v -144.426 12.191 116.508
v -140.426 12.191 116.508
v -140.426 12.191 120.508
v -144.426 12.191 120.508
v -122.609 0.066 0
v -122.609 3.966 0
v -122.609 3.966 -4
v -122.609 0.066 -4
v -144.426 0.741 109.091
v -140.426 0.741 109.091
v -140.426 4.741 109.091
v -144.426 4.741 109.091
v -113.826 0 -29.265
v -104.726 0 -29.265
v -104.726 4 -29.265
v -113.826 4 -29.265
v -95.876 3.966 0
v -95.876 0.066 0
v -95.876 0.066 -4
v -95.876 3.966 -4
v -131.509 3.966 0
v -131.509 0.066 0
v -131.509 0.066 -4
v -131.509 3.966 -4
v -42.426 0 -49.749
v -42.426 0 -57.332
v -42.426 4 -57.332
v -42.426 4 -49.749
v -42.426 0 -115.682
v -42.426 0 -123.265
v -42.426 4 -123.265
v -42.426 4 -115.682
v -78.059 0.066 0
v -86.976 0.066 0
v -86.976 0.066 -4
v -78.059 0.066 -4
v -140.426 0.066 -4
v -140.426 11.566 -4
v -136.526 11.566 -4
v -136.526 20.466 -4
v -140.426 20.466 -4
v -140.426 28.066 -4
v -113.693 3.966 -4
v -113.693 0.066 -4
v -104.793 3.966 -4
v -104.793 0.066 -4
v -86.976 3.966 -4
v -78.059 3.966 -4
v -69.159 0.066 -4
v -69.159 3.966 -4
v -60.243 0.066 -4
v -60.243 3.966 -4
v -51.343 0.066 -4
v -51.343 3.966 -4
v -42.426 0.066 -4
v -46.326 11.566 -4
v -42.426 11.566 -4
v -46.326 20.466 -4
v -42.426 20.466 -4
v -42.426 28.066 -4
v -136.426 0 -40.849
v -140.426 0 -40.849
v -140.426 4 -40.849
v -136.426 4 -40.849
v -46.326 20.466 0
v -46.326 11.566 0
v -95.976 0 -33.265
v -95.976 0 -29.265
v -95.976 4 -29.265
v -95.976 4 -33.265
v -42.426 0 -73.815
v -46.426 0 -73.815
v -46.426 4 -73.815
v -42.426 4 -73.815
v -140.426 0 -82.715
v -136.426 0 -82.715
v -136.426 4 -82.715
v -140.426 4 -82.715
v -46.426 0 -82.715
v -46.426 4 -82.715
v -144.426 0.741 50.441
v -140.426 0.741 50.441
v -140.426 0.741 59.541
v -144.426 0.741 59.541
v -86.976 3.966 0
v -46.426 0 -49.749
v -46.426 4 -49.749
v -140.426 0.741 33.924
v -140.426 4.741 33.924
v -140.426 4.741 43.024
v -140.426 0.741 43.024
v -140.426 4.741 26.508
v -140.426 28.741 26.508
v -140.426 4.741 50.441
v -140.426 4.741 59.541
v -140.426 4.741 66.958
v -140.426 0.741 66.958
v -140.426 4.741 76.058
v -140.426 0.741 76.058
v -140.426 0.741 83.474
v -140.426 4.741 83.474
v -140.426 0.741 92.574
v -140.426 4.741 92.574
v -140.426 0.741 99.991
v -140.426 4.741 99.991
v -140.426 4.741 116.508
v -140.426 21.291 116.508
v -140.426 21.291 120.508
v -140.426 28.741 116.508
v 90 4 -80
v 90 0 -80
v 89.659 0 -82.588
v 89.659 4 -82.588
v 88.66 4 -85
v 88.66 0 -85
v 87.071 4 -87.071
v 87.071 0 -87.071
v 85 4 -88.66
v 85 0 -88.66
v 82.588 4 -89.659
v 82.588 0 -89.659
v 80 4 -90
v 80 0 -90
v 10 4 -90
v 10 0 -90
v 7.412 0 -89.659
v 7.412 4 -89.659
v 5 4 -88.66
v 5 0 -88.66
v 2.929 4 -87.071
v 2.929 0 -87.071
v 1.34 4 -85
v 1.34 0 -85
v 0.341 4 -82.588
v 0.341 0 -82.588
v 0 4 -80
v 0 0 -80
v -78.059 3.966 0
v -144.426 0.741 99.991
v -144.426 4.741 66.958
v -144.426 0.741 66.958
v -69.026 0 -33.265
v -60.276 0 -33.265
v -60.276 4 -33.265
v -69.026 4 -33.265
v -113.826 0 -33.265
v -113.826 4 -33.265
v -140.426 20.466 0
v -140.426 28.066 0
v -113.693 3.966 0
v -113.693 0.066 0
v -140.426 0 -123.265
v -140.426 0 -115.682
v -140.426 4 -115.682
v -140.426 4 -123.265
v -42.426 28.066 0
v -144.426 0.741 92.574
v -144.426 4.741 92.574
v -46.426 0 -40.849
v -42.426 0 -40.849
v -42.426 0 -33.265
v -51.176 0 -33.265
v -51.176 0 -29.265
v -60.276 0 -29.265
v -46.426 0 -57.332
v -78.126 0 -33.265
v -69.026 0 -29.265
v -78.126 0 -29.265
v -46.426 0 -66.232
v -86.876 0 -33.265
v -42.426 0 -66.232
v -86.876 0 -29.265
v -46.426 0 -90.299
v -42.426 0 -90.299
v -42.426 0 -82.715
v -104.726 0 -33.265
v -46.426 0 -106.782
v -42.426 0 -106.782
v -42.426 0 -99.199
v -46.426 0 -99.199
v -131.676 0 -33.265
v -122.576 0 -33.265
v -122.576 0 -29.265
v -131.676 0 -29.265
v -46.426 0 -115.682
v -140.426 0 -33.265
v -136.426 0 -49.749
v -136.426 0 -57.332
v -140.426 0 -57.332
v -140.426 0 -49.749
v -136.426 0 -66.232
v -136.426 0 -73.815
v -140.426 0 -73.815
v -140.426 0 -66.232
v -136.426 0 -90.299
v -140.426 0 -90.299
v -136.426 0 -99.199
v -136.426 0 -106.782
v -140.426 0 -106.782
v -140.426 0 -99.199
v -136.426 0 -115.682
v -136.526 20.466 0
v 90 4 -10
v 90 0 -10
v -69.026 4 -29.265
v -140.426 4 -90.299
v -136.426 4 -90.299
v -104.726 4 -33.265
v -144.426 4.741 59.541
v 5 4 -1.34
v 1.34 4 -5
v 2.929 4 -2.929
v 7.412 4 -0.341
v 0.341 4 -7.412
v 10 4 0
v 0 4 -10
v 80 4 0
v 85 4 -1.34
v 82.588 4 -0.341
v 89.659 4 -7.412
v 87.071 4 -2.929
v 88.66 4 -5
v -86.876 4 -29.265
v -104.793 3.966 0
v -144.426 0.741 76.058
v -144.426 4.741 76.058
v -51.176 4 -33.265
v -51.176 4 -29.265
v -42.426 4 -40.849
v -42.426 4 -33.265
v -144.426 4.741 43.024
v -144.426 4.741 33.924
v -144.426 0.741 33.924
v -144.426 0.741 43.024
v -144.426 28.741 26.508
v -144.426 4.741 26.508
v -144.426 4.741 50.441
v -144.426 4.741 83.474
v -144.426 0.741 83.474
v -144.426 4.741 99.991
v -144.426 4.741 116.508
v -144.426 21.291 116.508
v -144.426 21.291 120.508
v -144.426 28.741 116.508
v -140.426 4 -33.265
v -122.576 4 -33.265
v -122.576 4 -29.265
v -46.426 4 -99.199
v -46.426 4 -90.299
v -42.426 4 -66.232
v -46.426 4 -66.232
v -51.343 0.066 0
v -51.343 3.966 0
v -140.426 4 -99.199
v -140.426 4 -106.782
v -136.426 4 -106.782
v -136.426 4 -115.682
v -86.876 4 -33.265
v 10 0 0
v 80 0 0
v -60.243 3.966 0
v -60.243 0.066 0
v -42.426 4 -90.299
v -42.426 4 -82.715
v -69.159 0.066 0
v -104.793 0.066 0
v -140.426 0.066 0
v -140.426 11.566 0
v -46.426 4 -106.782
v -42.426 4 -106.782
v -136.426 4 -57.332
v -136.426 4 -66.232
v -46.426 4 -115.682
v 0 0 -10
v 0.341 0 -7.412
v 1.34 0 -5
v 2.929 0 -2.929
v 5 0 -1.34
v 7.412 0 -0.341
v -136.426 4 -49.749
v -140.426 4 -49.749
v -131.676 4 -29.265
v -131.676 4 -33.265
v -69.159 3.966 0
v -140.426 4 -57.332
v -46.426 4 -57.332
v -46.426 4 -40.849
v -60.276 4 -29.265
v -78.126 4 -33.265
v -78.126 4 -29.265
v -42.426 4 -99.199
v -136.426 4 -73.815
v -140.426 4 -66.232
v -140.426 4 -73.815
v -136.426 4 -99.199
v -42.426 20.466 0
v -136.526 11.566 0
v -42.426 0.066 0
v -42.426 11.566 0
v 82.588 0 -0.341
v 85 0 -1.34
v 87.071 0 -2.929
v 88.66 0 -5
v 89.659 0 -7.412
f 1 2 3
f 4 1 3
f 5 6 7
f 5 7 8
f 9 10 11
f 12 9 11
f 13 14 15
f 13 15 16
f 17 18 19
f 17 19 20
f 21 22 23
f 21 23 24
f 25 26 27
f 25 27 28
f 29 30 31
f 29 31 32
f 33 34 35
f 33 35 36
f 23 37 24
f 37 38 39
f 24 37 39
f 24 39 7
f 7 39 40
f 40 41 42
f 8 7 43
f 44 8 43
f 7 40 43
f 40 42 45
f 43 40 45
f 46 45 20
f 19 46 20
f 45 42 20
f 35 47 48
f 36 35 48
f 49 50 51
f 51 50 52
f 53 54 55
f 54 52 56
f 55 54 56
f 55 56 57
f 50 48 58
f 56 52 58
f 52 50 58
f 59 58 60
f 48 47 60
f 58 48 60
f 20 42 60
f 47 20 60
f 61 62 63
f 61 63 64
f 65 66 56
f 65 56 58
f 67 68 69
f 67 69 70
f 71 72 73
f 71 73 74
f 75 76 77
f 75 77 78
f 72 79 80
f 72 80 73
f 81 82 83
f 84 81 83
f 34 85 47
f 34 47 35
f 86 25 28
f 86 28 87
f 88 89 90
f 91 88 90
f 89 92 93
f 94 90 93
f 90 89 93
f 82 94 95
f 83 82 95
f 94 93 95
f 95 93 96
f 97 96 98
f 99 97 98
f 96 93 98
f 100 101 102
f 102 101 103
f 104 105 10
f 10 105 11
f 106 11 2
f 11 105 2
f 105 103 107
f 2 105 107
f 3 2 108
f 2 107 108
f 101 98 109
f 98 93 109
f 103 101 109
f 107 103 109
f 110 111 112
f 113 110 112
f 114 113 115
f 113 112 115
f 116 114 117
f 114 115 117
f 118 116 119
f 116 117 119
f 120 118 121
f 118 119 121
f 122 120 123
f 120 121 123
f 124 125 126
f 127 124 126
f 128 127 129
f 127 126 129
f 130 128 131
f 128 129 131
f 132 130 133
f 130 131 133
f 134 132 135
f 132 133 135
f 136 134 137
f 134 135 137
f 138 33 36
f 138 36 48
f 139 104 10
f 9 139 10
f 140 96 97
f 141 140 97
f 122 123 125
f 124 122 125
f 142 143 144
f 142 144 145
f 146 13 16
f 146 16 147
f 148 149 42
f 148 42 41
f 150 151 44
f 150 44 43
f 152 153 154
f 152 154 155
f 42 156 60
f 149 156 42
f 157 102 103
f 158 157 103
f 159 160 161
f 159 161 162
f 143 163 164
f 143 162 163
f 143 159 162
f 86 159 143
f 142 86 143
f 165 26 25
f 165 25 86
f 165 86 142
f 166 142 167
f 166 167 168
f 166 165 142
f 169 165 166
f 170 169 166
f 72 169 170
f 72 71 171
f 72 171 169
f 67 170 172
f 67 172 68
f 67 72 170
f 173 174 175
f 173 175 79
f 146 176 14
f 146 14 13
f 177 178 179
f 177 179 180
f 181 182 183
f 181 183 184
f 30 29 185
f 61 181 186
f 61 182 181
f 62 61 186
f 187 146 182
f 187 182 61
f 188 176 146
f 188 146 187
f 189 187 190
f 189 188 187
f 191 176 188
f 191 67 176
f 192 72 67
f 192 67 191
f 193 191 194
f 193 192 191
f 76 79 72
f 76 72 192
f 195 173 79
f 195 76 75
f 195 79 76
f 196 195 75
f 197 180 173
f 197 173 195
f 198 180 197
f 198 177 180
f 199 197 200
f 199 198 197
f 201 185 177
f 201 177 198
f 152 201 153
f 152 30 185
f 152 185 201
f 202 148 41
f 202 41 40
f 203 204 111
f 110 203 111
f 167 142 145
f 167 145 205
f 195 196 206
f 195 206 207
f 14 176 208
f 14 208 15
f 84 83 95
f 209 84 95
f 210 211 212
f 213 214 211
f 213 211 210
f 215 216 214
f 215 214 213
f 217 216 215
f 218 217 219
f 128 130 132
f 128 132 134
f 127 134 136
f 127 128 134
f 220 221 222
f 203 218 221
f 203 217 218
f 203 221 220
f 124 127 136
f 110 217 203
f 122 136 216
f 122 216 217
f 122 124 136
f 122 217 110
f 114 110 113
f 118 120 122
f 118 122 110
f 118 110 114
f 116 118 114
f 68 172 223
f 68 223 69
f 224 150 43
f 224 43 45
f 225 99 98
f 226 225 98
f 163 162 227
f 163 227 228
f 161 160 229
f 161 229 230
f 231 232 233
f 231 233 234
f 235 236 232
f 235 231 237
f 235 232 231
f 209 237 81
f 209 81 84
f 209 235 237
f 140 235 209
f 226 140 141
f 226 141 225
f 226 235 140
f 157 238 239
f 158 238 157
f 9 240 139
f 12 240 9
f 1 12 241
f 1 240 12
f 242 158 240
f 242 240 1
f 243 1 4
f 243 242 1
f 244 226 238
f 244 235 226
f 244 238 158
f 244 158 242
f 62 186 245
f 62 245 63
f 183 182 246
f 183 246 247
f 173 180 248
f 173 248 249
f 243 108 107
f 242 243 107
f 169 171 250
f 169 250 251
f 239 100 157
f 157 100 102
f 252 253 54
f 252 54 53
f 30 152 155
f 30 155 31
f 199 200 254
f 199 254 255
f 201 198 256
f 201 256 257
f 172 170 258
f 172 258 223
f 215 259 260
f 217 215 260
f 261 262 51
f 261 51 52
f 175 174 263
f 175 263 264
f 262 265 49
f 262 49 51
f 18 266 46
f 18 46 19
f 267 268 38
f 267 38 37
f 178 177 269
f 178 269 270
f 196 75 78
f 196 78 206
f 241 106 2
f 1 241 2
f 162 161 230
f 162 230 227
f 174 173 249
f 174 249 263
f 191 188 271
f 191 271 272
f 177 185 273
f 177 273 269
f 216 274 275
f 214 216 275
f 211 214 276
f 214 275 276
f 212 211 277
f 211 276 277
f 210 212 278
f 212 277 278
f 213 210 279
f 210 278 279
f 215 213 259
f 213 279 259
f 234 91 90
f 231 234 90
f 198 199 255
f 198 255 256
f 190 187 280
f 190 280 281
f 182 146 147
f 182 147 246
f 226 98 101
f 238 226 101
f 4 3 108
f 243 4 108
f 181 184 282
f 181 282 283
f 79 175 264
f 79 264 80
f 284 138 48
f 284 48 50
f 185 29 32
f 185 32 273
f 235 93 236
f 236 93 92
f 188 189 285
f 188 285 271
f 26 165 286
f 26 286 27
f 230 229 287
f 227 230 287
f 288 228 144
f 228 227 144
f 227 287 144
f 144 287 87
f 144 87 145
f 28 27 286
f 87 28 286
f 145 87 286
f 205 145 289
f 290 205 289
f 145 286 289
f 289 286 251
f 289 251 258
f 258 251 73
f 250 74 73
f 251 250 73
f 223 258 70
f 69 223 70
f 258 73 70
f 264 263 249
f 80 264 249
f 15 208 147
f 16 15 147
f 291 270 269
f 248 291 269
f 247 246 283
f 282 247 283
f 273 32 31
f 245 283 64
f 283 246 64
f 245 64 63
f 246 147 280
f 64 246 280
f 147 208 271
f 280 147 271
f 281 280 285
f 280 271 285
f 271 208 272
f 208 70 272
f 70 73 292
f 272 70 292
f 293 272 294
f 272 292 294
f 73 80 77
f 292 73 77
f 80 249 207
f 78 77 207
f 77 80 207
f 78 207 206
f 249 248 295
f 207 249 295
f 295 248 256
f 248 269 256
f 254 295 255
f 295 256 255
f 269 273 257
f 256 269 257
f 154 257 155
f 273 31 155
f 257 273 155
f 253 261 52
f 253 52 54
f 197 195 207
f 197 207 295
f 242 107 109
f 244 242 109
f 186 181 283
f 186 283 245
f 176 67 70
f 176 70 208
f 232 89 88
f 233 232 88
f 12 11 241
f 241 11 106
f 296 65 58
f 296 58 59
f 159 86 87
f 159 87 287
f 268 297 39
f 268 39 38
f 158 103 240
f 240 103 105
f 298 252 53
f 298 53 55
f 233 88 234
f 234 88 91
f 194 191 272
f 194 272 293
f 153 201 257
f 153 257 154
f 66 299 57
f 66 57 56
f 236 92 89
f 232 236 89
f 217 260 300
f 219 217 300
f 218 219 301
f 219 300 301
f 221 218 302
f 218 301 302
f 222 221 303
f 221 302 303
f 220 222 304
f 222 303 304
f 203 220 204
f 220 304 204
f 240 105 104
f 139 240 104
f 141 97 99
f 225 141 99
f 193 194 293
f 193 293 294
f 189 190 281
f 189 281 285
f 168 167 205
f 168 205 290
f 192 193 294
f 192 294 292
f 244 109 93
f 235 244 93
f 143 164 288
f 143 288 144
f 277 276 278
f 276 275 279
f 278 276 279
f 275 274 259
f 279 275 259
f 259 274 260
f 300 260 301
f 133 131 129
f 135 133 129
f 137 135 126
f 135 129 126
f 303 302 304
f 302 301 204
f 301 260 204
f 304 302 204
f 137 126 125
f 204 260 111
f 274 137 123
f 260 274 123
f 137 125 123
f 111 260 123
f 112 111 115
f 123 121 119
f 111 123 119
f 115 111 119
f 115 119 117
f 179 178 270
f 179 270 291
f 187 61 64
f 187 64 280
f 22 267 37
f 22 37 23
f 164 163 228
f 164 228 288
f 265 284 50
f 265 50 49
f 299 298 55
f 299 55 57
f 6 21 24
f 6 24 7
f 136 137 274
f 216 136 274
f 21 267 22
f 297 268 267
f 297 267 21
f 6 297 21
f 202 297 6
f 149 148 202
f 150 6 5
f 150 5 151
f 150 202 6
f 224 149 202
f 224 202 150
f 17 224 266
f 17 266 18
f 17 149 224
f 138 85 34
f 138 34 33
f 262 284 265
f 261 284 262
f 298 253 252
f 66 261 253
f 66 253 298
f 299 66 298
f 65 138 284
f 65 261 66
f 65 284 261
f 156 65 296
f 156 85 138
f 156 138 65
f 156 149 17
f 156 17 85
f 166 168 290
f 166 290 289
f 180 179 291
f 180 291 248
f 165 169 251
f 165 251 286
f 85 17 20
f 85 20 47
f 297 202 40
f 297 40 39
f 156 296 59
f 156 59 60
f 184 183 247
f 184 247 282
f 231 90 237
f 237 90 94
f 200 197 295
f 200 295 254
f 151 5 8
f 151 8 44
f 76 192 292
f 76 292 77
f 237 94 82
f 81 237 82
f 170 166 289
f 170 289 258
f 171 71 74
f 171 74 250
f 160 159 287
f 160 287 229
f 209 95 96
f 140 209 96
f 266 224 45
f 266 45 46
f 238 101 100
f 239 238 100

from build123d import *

# Parameters (mm, degrees)
BOSS_EXTRUDE1_DEPTH = 4
BOSS_EXTRUDE2_DEPTH = 4
BOSS_EXTRUDE3_DEPTH = 4
BOSS_EXTRUDE4_DEPTH = 4


with BuildPart() as part:
    # Sketch1 → Boss-Extrude1 (new body)
    with BuildSketch(Plane(origin=(0, 0, 0), x_dir=(1, 0, 0), z_dir=(0, 1, 0))):
        with BuildLine():
            Line((10, 0), (80, 0))
            ThreePointArc((80, 0), (87.071067812, 2.928932188), (90, 10))
            Line((90, 10), (90, 80))
            ThreePointArc((90, 80), (87.071067812, 87.071067812), (80, 90))
            Line((80, 90), (10, 90))
            ThreePointArc((10, 90), (2.928932188, 87.071067812), (0, 80))
            Line((0, 80), (0, 10))
            ThreePointArc((0, 10), (2.928932188, 2.928932188), (10, 0))
        make_face()
    extrude(amount=BOSS_EXTRUDE1_DEPTH)


with BuildPart() as body_2:
    # Sketch2 → Boss-Extrude2 (new body)
    with BuildSketch(Plane.XY):
        Polygon((-140.425884488, 0.066456233), (-131.509217822, 0.066456233), (-131.509217822, 3.966456233), (-122.609217822, 3.966456233), (-122.609217822, 0.066456233), (-113.692551155, 0.066456233), (-113.692551155, 3.966456233), (-104.792551155, 3.966456233), (-104.792551155, 0.066456233), (-95.875884488, 0.066456233), (-95.875884488, 3.966456233), (-86.975884488, 3.966456233), (-86.975884488, 0.066456233), (-78.059217822, 0.066456233), (-78.059217822, 3.966456233), (-69.159217822, 3.966456233), (-69.159217822, 0.066456233), (-60.242551155, 0.066456233), (-60.242551155, 3.966456233), (-51.342551155, 3.966456233), (-51.342551155, 0.066456233), (-42.425884488, 0.066456233), (-42.425884488, 11.566456233), (-46.325884488, 11.566456233), (-46.325884488, 20.466456233), (-42.425884488, 20.466456233), (-42.425884488, 28.066456233), (-140.425884488, 28.066456233), (-140.425884488, 20.466456233), (-136.525884488, 20.466456233), (-136.525884488, 11.566456233), (-140.425884488, 11.566456233), align=None)
    extrude(amount=-BOSS_EXTRUDE2_DEPTH)


with BuildPart() as body_3:
    # Sketch4 → Boss-Extrude3 (new body)
    with BuildSketch(Plane(origin=(0, 0, 0), x_dir=(1, 0, 0), z_dir=(0, 1, 0))):
        Polygon((-51.175884488, 29.265358113), (-60.275884488, 29.265358113), (-60.275884488, 33.265358113), (-69.025884488, 33.265358113), (-69.025884488, 29.265358113), (-78.125884488, 29.265358113), (-78.125884488, 33.265358113), (-86.875884488, 33.265358113), (-86.875884488, 29.265358113), (-95.975884488, 29.265358113), (-95.975884488, 33.265358113), (-104.725884488, 33.265358113), (-104.725884488, 29.265358113), (-113.825884488, 29.265358113), (-113.825884488, 33.265358113), (-122.575884488, 33.265358113), (-122.575884488, 29.265358113), (-131.675884488, 29.265358113), (-131.675884488, 33.265358113), (-140.425884488, 33.265358113), (-140.425884488, 40.848691447), (-136.425884488, 40.848691447), (-136.425884488, 49.748691447), (-140.425884488, 49.748691447), (-140.425884488, 57.33202478), (-136.425884488, 57.33202478), (-136.425884488, 66.23202478), (-140.425884488, 66.23202478), (-140.425884488, 73.815358113), (-136.425884488, 73.815358113), (-136.425884488, 82.715358113), (-140.425884488, 82.715358113), (-140.425884488, 90.298691447), (-136.425884488, 90.298691447), (-136.425884488, 99.198691447), (-140.425884488, 99.198691447), (-140.425884488, 106.78202478), (-136.425884488, 106.78202478), (-136.425884488, 115.68202478), (-140.425884488, 115.68202478), (-140.425884488, 123.265358113), (-42.425884488, 123.265358113), (-42.425884488, 115.68202478), (-46.425884488, 115.68202478), (-46.425884488, 106.78202478), (-42.425884488, 106.78202478), (-42.425884488, 99.198691447), (-46.425884488, 99.198691447), (-46.425884488, 90.298691447), (-42.425884488, 90.298691447), (-42.425884488, 82.715358113), (-46.425884488, 82.715358113), (-46.425884488, 73.815358113), (-42.425884488, 73.815358113), (-42.425884488, 66.23202478), (-46.425884488, 66.23202478), (-46.425884488, 57.33202478), (-42.425884488, 57.33202478), (-42.425884488, 49.748691447), (-46.425884488, 49.748691447), (-46.425884488, 40.848691447), (-42.425884488, 40.848691447), (-42.425884488, 33.265358113), (-51.175884488, 33.265358113), align=None)
    extrude(amount=BOSS_EXTRUDE3_DEPTH)


with BuildPart() as body_4:
    # Sketch5 → Boss-Extrude4 (new body)
    with BuildSketch(Plane.ZY.offset(140.425884488)):
        Polygon((120.507785088, 21.291262613), (116.507785088, 21.291262613), (116.507785088, 28.741262613), (26.507785088, 28.741262613), (26.507785088, 4.741262613), (33.924451754, 4.741262613), (33.924451754, 0.741262613), (43.024451754, 0.741262613), (43.024451754, 4.741262613), (50.441118421, 4.741262613), (50.441118421, 0.741262613), (59.541118421, 0.741262613), (59.541118421, 4.741262613), (66.957785088, 4.741262613), (66.957785088, 0.741262613), (76.057785088, 0.741262613), (76.057785088, 4.741262613), (83.474451754, 4.741262613), (83.474451754, 0.741262613), (92.574451754, 0.741262613), (92.574451754, 4.741262613), (99.991118421, 4.741262613), (99.991118421, 0.741262613), (109.091118421, 0.741262613), (109.091118421, 4.741262613), (116.507785088, 4.741262613), (116.507785088, 12.191262613), (120.507785088, 12.191262613), align=None)
    extrude(amount=BOSS_EXTRUDE4_DEPTH)


solid = Compound([part.part, body_2.part, body_3.part, body_4.part])
